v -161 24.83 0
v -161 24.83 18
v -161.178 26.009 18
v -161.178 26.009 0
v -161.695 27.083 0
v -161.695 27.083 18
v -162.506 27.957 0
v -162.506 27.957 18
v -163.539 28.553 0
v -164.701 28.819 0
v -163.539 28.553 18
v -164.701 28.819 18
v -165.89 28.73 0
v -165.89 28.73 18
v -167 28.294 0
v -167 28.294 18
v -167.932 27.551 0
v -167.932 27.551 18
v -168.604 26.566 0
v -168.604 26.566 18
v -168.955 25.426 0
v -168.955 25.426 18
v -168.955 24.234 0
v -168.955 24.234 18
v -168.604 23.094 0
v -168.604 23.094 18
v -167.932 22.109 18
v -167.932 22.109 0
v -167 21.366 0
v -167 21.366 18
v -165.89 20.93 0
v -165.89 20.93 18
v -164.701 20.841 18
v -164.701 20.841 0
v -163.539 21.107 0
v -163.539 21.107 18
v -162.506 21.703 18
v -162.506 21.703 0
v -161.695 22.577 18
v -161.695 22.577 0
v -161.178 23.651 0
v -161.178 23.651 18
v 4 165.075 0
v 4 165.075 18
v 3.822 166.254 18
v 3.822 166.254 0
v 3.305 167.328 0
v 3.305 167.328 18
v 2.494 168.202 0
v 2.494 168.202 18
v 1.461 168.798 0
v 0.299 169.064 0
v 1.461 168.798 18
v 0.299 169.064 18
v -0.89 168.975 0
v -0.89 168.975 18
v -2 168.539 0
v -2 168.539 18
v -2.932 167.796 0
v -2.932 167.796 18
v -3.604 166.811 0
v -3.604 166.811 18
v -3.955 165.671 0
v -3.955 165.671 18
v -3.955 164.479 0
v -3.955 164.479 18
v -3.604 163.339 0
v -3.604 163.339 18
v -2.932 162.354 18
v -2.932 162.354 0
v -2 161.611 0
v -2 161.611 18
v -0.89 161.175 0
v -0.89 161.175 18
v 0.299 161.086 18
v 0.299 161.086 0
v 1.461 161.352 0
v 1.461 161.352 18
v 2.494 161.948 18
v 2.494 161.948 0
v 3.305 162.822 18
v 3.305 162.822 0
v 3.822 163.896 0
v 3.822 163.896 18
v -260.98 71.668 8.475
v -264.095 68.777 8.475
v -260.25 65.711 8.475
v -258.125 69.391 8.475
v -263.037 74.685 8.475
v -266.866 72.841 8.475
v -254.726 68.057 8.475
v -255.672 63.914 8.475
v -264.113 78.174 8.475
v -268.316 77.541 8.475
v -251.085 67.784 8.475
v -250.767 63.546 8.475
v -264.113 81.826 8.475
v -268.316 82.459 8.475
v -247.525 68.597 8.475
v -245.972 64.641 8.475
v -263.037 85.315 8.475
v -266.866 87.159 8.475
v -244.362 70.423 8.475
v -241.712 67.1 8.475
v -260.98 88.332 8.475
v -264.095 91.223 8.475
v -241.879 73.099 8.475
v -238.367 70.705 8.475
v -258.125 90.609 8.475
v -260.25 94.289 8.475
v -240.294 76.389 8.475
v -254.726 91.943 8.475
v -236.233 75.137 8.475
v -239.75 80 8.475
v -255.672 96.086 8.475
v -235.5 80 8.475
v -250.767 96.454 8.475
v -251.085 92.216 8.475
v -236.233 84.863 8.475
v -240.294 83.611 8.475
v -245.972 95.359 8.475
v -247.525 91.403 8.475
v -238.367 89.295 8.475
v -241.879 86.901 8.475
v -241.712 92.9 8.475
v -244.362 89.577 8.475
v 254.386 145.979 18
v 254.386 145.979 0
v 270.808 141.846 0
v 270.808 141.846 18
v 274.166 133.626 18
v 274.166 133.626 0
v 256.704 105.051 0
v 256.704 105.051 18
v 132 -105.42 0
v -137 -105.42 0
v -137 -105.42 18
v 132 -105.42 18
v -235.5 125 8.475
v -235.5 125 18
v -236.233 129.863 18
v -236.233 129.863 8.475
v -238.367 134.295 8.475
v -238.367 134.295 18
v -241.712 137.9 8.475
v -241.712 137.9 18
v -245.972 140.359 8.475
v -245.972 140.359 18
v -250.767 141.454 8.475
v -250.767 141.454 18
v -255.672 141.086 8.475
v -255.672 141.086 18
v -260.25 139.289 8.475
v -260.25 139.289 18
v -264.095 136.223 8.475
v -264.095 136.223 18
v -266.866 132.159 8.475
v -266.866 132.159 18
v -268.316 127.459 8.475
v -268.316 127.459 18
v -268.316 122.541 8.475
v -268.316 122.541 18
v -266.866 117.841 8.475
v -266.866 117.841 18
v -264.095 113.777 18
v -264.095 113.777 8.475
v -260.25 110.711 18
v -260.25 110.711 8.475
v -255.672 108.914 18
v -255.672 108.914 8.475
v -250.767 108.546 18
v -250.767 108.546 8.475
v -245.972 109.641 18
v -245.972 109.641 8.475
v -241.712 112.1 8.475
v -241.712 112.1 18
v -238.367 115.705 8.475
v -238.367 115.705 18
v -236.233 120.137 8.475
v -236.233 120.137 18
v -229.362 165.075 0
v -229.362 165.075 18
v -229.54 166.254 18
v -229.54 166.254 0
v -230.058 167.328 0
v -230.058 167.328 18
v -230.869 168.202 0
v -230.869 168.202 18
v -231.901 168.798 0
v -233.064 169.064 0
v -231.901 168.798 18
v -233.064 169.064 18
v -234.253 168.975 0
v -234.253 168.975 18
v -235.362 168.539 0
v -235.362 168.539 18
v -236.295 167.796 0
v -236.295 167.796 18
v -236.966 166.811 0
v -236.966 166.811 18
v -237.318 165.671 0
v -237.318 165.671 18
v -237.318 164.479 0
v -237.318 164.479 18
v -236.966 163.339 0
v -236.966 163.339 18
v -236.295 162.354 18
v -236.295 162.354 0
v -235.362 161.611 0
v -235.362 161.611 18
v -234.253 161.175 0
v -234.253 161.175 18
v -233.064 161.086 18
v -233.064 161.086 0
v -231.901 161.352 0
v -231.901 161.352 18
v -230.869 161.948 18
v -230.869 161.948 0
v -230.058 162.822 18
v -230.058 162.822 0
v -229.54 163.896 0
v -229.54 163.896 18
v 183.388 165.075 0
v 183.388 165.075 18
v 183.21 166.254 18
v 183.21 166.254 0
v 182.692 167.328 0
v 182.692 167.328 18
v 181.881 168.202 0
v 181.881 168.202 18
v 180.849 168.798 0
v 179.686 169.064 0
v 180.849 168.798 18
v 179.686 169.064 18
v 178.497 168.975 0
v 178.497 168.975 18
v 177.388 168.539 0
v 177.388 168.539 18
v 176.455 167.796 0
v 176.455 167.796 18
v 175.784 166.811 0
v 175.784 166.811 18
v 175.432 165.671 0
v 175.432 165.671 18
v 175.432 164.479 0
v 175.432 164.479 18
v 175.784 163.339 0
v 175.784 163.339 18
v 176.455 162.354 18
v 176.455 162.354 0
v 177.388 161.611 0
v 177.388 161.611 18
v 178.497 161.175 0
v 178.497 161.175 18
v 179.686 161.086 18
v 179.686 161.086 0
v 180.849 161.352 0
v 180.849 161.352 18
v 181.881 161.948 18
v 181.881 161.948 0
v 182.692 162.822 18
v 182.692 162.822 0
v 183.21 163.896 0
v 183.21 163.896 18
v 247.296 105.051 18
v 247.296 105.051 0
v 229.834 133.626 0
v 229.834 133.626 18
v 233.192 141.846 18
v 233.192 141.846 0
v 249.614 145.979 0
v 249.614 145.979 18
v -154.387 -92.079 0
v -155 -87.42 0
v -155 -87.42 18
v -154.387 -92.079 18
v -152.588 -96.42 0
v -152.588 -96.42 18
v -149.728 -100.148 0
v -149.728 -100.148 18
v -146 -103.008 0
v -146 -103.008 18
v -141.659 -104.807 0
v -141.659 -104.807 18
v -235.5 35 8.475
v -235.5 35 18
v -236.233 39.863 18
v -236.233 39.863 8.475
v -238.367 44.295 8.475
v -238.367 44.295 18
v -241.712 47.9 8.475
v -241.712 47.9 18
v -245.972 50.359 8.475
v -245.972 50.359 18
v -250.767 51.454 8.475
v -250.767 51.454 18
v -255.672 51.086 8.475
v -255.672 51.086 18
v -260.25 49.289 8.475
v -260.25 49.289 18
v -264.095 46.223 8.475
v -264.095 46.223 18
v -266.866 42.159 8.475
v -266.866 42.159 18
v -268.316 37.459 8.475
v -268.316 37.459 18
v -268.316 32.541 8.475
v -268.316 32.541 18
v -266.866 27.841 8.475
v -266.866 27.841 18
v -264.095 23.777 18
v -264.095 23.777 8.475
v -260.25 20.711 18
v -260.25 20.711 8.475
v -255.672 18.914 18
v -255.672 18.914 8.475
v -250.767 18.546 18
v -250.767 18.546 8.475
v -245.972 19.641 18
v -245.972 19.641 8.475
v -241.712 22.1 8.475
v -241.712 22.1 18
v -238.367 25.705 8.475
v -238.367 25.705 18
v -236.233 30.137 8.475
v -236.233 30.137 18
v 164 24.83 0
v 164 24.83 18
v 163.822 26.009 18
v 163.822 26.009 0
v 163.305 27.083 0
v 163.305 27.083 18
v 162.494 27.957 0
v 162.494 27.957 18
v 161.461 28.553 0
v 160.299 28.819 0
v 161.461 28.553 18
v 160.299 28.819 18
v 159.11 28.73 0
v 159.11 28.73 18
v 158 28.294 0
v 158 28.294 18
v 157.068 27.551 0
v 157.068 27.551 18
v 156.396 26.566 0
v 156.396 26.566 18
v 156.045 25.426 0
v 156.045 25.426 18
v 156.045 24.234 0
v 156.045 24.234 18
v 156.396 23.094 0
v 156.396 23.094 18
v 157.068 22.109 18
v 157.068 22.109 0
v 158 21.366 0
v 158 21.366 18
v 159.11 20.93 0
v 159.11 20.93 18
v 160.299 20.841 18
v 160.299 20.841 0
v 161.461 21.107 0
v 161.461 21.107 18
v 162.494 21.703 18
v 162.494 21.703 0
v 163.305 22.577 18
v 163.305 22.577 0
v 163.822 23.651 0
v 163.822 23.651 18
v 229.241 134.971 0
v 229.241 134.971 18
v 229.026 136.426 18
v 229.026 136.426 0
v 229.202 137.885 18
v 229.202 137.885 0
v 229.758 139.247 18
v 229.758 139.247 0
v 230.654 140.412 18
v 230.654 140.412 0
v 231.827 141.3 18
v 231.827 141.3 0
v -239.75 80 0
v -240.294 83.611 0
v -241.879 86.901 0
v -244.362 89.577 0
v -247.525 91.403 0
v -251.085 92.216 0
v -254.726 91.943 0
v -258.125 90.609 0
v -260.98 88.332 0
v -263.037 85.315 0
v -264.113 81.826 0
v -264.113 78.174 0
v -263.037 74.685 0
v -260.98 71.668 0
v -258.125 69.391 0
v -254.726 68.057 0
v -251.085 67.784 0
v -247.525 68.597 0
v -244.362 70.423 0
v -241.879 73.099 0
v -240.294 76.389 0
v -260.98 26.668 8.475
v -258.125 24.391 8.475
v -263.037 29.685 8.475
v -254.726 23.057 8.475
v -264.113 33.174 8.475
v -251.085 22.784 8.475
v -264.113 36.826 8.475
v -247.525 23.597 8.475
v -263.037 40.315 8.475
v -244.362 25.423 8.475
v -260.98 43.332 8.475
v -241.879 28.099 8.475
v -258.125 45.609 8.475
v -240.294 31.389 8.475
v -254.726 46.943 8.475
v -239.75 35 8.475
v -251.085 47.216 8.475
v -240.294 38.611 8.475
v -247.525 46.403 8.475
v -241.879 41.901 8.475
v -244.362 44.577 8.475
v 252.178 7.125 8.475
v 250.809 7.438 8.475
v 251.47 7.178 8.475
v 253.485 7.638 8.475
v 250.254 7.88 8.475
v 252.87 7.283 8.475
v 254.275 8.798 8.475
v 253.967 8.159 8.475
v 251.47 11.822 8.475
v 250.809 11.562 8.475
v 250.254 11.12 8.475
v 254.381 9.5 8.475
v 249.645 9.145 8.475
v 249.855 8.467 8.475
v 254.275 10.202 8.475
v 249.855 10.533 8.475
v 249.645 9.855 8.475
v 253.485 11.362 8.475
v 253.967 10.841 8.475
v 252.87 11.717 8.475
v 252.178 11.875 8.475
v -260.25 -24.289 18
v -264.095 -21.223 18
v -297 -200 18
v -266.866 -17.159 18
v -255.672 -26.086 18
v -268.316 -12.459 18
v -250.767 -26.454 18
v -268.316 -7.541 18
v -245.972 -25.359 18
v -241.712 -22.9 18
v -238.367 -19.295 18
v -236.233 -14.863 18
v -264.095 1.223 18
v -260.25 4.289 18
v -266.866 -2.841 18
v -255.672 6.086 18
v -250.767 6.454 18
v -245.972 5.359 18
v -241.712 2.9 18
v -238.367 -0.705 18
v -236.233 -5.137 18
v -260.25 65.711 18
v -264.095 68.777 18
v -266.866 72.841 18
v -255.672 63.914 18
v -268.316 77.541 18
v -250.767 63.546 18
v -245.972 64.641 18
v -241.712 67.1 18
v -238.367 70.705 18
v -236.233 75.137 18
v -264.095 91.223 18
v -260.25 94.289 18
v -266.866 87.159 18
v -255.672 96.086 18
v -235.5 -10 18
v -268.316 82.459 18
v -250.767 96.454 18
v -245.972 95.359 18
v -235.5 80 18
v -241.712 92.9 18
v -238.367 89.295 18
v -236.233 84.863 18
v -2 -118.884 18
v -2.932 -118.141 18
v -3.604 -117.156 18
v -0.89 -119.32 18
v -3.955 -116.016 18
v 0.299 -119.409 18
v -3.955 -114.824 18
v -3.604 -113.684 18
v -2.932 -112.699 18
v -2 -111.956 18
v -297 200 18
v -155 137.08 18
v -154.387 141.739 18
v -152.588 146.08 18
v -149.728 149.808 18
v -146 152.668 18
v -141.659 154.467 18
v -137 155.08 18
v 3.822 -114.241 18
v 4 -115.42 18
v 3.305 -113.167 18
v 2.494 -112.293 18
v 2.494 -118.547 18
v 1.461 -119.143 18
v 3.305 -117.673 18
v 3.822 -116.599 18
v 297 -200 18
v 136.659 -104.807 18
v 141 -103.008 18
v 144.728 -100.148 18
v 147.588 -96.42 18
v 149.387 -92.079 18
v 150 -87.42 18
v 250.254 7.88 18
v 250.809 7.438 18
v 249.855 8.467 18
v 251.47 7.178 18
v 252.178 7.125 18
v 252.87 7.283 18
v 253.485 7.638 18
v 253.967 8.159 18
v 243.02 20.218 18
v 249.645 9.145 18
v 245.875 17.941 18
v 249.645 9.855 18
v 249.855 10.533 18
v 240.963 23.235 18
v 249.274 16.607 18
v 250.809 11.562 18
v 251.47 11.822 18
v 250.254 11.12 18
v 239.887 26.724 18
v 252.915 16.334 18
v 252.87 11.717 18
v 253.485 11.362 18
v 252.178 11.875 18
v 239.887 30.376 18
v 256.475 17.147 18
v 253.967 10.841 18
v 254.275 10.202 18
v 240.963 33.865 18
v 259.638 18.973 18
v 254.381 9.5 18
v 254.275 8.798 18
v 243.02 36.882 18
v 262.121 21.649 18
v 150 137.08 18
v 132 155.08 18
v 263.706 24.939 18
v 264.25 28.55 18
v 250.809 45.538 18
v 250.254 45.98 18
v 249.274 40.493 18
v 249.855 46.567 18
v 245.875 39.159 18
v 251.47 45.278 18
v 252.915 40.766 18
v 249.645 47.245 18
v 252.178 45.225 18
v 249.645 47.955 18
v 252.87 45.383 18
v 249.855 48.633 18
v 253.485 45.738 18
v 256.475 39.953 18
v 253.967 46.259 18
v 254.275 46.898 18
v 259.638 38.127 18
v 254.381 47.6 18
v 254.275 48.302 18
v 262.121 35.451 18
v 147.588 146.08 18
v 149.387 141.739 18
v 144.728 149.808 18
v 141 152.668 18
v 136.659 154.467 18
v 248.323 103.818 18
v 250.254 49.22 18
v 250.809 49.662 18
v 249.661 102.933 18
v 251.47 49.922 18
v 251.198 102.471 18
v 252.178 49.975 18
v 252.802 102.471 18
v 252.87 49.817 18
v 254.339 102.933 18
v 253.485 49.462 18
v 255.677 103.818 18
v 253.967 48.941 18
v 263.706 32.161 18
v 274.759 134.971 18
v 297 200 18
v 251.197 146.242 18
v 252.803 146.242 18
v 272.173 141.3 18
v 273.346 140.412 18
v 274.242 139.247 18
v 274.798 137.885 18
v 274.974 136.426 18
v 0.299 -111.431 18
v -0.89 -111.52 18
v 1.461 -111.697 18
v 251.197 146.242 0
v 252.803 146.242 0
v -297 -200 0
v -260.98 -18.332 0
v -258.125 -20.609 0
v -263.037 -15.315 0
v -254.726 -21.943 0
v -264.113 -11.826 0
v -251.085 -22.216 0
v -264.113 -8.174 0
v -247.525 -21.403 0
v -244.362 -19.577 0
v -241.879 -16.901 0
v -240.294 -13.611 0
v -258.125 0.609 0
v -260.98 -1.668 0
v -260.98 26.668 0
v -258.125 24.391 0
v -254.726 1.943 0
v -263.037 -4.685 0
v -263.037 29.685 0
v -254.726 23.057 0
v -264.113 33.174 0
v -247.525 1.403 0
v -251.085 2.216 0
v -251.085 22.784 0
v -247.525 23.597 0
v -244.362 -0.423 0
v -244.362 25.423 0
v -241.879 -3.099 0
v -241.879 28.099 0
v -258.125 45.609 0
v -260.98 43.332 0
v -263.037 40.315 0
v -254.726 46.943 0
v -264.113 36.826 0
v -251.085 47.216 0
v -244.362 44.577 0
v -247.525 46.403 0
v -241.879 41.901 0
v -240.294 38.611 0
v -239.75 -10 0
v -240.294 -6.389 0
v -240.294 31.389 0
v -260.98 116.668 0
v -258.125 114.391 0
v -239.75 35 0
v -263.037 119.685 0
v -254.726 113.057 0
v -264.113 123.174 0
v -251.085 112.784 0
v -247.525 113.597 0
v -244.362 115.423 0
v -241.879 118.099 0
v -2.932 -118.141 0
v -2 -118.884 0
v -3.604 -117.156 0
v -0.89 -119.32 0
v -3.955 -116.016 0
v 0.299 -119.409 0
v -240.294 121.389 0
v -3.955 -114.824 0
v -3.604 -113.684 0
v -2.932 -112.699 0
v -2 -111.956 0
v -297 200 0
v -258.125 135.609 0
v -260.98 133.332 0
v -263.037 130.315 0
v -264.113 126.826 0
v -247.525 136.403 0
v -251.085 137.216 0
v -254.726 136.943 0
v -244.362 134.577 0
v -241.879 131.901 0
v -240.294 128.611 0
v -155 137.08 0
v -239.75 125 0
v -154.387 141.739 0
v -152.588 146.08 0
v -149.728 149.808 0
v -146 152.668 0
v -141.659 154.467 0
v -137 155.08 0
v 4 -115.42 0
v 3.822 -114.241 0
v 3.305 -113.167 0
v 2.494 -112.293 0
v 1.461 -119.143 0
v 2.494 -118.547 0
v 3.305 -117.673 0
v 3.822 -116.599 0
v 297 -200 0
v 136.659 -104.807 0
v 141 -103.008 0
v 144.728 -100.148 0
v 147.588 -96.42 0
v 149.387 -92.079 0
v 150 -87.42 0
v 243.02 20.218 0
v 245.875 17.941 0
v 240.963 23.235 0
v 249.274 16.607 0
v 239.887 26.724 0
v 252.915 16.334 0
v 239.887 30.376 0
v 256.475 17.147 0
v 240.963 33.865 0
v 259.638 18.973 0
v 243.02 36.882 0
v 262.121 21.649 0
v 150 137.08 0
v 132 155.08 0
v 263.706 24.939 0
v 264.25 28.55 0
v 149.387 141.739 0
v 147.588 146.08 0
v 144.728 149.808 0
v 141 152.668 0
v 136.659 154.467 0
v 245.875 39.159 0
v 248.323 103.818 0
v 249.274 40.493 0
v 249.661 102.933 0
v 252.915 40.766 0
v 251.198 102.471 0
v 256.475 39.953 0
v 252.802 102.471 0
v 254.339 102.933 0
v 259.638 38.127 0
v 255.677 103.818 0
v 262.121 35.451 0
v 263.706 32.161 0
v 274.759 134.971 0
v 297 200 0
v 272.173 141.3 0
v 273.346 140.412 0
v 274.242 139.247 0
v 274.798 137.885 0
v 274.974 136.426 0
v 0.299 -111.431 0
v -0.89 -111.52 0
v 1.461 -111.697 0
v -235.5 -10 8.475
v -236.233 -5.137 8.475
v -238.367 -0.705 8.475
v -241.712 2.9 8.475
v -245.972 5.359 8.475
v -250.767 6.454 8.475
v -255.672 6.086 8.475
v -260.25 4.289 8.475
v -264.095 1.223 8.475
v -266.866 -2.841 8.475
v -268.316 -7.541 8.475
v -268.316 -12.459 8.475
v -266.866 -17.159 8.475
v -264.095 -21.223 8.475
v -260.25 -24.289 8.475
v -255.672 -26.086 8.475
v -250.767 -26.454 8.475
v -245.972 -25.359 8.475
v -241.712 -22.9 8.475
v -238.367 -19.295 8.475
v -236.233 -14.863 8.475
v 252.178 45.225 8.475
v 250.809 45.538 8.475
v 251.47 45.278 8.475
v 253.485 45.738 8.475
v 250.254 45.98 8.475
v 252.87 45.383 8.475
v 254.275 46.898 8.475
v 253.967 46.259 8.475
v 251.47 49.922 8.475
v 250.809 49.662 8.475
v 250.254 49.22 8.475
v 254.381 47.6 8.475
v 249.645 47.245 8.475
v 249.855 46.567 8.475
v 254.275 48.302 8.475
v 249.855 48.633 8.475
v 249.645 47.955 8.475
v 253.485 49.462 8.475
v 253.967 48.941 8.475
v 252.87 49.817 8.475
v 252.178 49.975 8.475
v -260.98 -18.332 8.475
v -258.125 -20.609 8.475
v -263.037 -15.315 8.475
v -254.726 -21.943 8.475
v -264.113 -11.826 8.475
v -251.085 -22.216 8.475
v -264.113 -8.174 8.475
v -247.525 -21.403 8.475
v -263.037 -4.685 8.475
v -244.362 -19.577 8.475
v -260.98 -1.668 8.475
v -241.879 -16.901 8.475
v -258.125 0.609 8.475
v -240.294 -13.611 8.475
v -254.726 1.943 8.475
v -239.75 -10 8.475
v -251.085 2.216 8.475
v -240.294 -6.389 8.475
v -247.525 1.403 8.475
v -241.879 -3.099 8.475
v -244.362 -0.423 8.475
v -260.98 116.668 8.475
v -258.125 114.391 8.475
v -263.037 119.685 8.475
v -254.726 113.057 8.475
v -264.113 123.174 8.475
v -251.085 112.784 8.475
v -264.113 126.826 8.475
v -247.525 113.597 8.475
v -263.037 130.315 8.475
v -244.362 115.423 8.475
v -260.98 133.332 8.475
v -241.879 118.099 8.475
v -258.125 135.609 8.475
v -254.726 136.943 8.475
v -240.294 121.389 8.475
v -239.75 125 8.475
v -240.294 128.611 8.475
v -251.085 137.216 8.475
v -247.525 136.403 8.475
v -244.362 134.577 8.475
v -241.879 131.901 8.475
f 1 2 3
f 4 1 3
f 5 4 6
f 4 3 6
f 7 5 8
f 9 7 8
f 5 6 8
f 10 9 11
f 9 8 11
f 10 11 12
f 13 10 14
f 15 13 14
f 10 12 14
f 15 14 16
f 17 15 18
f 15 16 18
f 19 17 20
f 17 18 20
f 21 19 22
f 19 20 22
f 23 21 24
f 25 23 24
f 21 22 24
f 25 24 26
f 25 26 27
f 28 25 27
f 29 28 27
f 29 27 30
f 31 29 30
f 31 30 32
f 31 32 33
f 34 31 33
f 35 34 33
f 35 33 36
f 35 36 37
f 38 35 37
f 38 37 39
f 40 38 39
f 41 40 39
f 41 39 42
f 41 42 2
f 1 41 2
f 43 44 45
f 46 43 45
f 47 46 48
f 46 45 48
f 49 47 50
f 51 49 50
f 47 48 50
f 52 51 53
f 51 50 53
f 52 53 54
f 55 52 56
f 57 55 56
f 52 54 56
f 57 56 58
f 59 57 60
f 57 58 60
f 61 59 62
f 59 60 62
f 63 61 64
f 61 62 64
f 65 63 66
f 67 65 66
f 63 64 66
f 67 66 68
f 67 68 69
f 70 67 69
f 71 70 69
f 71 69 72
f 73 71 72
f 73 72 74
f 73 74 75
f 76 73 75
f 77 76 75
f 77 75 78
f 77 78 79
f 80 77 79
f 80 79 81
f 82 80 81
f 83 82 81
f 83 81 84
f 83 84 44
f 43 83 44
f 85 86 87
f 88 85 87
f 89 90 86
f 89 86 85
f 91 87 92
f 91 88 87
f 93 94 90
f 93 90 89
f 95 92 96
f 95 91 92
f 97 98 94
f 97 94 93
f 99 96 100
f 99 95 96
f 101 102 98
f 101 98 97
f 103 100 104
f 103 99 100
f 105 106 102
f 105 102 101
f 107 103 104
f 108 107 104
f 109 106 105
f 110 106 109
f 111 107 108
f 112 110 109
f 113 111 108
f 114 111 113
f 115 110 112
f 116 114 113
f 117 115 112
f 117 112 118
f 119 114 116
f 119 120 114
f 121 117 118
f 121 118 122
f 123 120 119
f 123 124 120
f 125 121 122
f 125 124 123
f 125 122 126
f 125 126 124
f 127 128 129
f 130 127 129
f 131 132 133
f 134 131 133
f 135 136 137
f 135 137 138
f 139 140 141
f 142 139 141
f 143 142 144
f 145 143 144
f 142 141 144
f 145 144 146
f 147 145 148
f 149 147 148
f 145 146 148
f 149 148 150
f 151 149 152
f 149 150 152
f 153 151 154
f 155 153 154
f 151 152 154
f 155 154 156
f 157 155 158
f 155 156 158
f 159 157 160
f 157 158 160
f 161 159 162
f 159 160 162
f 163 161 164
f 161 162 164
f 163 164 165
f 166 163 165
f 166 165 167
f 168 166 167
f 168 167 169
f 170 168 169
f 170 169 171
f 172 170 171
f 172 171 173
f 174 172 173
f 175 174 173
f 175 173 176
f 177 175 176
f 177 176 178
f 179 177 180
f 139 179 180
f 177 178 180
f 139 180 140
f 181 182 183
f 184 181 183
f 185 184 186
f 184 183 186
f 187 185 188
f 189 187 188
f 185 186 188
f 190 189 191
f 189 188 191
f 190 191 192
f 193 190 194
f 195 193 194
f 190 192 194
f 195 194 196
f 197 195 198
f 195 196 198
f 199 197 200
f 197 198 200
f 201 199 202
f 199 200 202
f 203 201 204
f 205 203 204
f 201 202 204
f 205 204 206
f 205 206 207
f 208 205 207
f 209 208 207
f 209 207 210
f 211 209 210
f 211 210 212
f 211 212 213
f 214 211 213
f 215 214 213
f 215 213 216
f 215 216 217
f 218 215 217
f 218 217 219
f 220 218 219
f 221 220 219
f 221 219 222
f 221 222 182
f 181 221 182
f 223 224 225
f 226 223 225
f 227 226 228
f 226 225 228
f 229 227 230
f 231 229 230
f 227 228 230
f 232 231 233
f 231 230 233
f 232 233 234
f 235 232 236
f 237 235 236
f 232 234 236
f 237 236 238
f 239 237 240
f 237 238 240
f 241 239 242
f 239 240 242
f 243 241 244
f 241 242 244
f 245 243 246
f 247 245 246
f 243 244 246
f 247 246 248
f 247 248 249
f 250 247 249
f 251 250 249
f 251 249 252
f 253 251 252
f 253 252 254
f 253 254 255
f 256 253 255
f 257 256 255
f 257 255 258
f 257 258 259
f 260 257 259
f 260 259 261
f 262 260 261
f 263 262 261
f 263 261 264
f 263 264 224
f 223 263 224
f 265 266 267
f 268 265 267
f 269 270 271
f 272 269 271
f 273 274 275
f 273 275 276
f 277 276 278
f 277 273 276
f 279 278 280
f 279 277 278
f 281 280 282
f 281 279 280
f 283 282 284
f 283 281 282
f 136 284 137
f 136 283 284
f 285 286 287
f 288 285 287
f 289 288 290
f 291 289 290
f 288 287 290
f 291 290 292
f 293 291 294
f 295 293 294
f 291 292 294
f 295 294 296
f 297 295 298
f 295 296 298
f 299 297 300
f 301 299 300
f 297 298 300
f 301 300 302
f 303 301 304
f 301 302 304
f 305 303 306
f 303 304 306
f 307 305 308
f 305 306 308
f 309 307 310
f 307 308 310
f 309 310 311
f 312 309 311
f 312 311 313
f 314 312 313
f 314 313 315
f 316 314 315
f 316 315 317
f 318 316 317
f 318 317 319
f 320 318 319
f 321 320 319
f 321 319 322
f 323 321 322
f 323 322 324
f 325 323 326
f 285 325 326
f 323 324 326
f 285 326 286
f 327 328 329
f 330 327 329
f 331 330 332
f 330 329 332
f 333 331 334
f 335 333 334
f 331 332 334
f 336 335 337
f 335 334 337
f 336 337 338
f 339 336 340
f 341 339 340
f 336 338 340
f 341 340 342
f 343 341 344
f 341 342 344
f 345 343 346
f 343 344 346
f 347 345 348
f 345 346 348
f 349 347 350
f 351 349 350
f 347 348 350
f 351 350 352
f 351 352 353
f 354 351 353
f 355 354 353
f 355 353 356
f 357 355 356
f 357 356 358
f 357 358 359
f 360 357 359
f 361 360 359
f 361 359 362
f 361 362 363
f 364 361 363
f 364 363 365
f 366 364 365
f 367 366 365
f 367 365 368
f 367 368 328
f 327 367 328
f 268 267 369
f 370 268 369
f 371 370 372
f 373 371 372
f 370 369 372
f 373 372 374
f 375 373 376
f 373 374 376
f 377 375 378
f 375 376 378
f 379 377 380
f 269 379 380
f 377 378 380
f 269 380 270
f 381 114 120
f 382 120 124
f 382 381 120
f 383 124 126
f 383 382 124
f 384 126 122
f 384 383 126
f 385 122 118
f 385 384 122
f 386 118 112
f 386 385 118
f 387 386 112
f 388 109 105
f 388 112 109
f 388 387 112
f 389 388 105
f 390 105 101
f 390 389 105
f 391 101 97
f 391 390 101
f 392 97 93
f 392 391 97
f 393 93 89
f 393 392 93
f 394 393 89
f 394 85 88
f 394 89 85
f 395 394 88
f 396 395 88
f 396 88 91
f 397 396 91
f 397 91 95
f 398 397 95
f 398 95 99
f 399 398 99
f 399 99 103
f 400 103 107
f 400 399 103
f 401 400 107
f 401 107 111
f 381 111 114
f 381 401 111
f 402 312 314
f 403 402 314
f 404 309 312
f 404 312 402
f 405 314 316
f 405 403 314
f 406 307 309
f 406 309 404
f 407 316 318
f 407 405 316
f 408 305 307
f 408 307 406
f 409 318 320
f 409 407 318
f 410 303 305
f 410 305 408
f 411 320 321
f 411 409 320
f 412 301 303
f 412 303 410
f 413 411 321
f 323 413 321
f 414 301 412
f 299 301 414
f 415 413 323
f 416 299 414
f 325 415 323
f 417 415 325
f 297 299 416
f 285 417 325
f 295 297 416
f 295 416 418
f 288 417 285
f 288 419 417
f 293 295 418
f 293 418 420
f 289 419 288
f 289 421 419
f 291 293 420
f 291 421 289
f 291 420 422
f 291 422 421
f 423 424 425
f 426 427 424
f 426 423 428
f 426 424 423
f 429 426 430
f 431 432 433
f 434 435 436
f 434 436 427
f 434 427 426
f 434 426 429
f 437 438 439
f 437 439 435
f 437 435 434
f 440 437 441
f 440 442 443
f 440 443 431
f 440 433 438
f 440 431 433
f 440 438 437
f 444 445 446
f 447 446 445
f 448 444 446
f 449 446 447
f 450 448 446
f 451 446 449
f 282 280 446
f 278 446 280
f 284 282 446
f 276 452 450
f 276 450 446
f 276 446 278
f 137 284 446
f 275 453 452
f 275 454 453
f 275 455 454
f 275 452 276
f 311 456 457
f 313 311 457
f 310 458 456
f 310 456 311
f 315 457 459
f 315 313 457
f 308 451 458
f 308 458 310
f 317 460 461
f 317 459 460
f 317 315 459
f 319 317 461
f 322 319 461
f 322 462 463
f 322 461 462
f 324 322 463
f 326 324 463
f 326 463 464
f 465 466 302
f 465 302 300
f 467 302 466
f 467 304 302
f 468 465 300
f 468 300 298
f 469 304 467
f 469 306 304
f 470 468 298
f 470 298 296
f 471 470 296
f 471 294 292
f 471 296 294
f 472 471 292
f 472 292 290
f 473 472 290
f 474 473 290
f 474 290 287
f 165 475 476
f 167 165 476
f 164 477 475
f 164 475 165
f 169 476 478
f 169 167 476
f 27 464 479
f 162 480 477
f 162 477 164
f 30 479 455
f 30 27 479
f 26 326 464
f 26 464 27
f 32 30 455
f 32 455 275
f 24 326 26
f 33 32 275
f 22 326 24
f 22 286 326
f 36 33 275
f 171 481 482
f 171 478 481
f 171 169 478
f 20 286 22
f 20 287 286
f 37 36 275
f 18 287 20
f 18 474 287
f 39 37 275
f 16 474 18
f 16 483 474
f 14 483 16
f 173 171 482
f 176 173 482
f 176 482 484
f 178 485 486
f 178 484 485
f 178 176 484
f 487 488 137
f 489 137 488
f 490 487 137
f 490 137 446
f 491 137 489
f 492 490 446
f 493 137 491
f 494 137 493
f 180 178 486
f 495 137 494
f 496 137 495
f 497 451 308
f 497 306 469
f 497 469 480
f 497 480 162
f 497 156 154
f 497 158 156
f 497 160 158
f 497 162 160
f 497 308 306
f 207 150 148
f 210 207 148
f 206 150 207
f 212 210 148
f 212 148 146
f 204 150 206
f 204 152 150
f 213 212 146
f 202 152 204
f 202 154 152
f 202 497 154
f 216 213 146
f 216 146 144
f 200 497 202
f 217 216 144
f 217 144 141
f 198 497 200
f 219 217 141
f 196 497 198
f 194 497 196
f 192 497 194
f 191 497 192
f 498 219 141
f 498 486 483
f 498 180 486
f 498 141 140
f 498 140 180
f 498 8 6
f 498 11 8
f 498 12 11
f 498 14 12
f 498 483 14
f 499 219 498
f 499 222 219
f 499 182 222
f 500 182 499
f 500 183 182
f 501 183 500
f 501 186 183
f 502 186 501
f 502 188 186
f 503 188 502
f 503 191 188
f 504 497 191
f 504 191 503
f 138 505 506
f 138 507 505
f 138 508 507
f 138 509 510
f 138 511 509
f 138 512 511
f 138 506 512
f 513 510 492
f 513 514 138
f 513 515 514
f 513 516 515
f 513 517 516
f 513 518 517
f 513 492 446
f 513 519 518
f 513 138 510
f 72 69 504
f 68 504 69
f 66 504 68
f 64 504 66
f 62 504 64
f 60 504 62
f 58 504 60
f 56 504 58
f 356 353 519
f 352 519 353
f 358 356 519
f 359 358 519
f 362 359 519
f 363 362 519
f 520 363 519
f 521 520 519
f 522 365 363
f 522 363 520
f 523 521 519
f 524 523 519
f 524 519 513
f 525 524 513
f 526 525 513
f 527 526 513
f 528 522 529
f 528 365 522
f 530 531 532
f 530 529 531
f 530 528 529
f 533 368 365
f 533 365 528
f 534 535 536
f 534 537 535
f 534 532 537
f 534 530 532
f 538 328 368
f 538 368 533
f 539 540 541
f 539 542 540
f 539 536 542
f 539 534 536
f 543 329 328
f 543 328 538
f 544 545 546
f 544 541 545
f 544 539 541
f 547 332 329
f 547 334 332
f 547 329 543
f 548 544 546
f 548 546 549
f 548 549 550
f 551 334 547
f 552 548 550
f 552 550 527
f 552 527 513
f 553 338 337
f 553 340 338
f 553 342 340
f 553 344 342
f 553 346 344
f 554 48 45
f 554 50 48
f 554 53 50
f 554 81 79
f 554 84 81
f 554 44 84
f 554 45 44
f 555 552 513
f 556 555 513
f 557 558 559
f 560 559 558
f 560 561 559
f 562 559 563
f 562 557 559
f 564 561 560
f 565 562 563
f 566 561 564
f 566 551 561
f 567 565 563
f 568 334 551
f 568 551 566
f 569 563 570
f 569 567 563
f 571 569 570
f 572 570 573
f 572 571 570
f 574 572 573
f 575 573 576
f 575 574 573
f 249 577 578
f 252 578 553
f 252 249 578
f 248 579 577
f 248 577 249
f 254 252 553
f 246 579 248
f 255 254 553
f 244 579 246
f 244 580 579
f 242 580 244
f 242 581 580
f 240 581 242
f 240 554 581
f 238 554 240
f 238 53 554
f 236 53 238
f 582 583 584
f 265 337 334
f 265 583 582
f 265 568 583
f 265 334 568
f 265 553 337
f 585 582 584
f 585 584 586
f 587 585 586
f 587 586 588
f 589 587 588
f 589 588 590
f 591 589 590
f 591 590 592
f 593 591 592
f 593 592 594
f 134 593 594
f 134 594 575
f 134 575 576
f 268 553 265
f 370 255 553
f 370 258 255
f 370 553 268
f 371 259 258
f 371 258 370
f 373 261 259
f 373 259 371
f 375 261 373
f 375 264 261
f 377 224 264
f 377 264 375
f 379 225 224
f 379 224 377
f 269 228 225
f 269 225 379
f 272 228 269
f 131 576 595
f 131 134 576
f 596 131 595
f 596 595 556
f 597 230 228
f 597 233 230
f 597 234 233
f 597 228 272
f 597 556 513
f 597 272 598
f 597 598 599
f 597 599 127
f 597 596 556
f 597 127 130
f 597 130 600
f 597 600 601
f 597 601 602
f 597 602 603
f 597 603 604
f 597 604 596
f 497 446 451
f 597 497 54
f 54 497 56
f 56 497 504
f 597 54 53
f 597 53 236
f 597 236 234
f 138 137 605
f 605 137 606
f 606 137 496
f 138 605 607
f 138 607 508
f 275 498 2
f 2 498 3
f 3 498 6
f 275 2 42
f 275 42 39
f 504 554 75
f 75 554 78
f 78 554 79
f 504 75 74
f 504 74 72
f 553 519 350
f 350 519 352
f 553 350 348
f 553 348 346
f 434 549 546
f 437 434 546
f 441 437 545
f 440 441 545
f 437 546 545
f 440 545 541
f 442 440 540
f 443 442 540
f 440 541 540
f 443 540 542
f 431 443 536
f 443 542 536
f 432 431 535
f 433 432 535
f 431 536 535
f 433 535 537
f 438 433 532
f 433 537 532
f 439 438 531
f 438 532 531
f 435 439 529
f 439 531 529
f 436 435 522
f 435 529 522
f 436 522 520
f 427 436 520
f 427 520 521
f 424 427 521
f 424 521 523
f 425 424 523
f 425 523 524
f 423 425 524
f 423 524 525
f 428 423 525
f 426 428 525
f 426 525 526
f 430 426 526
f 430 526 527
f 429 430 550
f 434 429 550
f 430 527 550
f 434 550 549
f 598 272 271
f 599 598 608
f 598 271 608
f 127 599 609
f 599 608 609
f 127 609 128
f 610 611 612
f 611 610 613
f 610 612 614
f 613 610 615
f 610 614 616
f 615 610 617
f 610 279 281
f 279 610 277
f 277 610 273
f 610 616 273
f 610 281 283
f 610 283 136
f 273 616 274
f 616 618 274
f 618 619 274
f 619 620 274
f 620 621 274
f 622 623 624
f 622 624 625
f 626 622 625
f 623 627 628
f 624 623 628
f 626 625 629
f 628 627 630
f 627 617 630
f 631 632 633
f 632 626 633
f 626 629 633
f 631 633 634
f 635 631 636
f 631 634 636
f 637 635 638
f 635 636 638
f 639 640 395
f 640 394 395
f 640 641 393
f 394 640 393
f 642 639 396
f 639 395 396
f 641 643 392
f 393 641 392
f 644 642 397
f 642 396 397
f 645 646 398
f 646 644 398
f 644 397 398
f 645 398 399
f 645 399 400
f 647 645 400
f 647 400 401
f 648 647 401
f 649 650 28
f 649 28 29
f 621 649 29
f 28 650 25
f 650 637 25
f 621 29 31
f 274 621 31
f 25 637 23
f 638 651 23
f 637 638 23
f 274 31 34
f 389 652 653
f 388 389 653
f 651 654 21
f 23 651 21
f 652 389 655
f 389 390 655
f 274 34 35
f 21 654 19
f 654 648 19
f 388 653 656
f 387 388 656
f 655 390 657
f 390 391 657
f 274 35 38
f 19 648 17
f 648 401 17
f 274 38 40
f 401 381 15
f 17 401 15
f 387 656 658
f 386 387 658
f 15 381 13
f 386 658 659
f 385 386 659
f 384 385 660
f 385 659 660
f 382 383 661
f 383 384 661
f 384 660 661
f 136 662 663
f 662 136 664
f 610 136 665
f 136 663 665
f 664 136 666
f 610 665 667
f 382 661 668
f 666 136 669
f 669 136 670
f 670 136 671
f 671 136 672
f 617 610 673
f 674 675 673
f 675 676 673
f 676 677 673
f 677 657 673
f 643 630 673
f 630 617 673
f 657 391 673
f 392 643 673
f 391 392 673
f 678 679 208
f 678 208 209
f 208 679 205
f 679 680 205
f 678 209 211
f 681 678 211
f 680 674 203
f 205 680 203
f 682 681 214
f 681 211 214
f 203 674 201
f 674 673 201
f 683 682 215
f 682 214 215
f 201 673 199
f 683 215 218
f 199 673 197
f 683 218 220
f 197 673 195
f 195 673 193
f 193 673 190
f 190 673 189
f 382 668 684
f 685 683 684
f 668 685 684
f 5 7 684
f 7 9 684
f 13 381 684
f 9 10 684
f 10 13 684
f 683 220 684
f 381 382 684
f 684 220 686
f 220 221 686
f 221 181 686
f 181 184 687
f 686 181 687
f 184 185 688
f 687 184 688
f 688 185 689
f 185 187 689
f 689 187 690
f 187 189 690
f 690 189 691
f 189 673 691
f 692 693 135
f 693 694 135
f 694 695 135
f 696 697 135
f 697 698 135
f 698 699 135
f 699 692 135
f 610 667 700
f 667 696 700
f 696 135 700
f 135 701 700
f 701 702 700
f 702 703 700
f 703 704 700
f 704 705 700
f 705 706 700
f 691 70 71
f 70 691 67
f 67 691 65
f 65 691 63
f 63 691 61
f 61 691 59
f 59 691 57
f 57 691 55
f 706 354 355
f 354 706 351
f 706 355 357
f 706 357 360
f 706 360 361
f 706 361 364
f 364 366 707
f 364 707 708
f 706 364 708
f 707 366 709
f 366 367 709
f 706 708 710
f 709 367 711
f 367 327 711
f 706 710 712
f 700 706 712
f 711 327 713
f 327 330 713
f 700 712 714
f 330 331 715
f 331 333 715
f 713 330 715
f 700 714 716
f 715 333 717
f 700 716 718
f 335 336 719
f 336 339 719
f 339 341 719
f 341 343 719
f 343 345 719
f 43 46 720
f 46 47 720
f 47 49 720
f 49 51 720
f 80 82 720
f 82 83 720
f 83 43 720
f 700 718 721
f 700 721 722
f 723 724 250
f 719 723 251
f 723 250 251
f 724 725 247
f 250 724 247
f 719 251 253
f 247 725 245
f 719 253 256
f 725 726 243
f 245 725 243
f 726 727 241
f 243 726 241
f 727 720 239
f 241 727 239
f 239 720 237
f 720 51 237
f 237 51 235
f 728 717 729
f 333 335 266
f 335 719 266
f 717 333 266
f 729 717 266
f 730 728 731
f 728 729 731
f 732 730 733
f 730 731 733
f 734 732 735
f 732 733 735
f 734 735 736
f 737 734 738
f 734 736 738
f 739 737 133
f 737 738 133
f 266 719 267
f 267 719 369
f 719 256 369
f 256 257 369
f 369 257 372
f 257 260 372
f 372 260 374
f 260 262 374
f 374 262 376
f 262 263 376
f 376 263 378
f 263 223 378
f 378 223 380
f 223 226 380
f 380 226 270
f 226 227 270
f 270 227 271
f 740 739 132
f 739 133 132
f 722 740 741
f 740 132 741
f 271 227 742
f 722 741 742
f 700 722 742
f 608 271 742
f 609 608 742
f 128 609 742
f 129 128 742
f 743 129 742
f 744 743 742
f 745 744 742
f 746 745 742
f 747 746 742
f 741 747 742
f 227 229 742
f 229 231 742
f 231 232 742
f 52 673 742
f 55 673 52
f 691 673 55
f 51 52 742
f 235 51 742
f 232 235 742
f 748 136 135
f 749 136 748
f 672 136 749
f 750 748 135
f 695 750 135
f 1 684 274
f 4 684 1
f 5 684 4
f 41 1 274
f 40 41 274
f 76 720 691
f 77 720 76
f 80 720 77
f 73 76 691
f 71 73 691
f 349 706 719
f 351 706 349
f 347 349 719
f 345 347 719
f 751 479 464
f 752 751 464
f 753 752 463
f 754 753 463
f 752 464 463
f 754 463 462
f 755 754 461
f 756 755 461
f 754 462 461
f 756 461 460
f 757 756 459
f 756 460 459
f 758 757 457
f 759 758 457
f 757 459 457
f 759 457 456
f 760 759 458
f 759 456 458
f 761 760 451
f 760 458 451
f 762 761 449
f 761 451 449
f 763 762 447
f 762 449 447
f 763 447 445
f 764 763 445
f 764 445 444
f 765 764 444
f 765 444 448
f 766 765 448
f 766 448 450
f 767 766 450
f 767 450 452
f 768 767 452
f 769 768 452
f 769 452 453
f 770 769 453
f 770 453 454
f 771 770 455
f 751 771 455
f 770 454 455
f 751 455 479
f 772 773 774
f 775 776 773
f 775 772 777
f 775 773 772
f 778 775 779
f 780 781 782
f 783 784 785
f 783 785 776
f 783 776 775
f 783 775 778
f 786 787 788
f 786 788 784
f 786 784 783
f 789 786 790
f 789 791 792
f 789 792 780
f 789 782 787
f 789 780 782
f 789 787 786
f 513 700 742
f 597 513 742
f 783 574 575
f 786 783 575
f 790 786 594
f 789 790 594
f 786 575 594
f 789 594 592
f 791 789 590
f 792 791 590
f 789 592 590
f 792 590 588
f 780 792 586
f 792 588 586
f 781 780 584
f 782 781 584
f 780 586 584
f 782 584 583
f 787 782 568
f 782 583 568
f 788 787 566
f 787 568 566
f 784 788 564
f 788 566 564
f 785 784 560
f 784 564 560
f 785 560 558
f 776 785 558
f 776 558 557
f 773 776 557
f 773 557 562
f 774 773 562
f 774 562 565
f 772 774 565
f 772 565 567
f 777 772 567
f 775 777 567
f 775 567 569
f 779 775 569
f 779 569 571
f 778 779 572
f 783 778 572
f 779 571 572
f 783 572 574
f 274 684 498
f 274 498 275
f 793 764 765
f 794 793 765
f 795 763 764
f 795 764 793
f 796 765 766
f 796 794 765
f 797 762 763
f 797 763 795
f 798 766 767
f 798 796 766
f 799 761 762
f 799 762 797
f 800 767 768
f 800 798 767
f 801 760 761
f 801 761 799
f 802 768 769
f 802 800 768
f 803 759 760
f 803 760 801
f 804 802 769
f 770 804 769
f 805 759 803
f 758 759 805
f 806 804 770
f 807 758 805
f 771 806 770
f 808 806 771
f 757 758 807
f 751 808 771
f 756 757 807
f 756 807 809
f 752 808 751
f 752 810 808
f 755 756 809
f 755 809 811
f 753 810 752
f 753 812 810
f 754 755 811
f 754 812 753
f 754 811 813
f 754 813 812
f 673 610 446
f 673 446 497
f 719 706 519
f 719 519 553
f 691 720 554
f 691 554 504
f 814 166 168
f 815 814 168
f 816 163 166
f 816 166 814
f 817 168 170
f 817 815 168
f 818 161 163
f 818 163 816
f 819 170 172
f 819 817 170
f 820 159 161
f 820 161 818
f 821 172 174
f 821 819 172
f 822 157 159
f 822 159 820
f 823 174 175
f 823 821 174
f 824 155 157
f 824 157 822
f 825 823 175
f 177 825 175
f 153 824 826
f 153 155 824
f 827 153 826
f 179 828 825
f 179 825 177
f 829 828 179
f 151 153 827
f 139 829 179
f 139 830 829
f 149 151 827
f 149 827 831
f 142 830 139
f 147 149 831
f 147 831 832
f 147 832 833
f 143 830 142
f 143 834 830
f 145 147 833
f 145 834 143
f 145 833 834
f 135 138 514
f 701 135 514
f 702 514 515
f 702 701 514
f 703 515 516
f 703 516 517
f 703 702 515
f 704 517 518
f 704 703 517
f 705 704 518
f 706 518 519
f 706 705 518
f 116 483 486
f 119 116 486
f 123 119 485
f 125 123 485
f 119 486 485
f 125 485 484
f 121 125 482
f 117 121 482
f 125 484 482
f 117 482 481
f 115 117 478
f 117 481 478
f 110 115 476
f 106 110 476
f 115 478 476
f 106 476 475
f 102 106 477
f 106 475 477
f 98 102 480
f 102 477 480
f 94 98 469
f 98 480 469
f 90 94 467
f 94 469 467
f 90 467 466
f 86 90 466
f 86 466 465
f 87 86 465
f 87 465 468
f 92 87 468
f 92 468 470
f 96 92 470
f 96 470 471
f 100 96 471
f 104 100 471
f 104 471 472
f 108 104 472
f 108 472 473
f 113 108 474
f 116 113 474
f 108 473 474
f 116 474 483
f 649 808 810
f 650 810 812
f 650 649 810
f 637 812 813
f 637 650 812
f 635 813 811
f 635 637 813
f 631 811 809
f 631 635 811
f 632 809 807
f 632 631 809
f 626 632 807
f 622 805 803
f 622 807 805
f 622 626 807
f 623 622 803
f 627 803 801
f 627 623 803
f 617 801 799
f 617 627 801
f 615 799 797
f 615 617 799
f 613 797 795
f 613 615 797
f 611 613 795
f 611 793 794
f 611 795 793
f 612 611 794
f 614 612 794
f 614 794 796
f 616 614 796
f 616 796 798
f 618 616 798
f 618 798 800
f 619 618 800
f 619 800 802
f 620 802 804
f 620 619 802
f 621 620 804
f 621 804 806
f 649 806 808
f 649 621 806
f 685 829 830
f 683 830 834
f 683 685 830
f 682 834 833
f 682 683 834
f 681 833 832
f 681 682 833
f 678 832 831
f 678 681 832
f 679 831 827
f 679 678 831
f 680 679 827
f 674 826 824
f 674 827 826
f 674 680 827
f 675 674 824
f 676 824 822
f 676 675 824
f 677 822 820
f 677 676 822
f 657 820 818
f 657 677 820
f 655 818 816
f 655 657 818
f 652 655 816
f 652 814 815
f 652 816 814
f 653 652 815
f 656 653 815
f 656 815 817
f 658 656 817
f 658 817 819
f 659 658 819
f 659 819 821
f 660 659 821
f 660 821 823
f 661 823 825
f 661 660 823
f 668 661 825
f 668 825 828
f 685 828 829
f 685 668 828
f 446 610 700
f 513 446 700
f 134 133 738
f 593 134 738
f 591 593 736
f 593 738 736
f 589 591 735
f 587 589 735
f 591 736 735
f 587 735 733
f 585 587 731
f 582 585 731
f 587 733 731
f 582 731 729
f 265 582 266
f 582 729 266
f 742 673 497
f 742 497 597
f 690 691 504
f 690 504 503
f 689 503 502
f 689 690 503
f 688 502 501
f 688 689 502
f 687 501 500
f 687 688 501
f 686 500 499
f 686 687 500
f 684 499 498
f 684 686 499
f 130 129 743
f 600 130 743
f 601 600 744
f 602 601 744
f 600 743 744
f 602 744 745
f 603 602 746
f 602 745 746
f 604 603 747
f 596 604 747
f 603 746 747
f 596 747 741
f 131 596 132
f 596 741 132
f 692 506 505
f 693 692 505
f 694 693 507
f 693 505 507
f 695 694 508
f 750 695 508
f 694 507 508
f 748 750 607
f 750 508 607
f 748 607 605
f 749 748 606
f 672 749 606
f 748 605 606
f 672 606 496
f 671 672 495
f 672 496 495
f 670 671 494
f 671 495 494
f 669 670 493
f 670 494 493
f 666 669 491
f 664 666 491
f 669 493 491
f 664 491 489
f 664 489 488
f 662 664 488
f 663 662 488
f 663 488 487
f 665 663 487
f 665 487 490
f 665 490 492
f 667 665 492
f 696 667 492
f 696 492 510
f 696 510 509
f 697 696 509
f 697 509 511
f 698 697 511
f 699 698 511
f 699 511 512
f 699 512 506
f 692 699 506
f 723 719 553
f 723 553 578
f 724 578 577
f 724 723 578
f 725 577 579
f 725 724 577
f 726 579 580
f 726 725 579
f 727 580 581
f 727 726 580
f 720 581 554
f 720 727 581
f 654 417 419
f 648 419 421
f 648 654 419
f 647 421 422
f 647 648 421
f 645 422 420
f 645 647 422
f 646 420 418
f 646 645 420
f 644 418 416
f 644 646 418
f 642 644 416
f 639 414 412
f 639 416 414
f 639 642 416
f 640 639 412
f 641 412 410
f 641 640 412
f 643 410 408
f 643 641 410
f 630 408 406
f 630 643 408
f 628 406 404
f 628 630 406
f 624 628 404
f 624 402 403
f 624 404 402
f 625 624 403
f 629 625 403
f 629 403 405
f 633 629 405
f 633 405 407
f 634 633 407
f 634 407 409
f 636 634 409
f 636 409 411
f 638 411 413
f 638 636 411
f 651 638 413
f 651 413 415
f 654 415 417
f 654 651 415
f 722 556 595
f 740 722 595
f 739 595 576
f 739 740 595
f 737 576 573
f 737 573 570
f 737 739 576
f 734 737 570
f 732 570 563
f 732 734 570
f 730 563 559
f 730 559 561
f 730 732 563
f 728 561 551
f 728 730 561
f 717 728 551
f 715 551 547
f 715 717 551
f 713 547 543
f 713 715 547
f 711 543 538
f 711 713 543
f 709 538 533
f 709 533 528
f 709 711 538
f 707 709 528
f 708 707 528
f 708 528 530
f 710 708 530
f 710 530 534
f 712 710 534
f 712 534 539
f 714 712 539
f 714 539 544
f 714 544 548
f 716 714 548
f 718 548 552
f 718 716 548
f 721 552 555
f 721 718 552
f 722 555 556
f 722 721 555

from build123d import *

# Parameters (mm, degrees)
SKETCH1_W           = 594
SKETCH1_H           = 400
SKETCH1_R           = 12.25
BOSS_EXTRUDE1_DEPTH = 18
SKETCH2_R           = 16.5
CUT_EXTRUDE1_DEPTH  = 9.525
SKETCH3_R           = 4
CUT_EXTRUDE2_DEPTH  = 80
SKETCH4_R           = 2.38125
CUT_EXTRUDE3_DEPTH  = 9.525


with BuildPart() as part:
    # Sketch1 → Boss-Extrude1 (new body)
    with BuildSketch(Plane.XY):
        Rectangle(SKETCH1_W, SKETCH1_H)
        with Locations((252, 28.55)):
            Circle(SKETCH1_R, mode=Mode.SUBTRACT)
        with Locations((-252, 125)):
            Circle(SKETCH1_R, mode=Mode.SUBTRACT)
        with Locations((-252, 80)):
            Circle(SKETCH1_R, mode=Mode.SUBTRACT)
        with Locations((-252, 35)):
            Circle(SKETCH1_R, mode=Mode.SUBTRACT)
        with Locations((-252, -10)):
            Circle(SKETCH1_R, mode=Mode.SUBTRACT)
        with BuildLine():
            Line((-137, -105.42), (132, -105.42))
            ThreePointArc((132, -105.42), (144.727922061, -100.147922061), (150, -87.42))
            Line((150, -87.42), (150, 137.08))
            ThreePointArc((150, 137.08), (144.727922061, 149.807922061), (132, 155.08))
            Line((132, 155.08), (-137, 155.08))
            ThreePointArc((-137, 155.08), (-149.727922061, 149.807922061), (-155, 137.08))
            Line((-155, 137.08), (-155, -87.42))
            ThreePointArc((-155, -87.42), (-149.727922061, -100.147922061), (-137, -105.42))
        make_face(mode=Mode.SUBTRACT)
        with BuildLine():
            Line((254.386023622, 145.979320454), (270.808070866, 141.845754885))
            ThreePointArc((270.808070866, 141.845754885), (274.565595901, 138.584722637), (274.166216108, 133.625506823))
            Line((274.166216108, 133.625506823), (256.703716108, 105.050506823))
            ThreePointArc((256.703716108, 105.050506823), (252, 102.4125), (247.296283892, 105.050506823))
            Line((247.296283892, 105.050506823), (229.833783892, 133.625506823))
            ThreePointArc((229.833783892, 133.625506823), (229.434404099, 138.584722637), (233.191929134, 141.845754885))
            Line((233.191929134, 141.845754885), (249.613976378, 145.979320454))
            ThreePointArc((249.613976378, 145.979320454), (252, 146.275), (254.386023622, 145.979320454))
        make_face(mode=Mode.SUBTRACT)
    extrude(amount=BOSS_EXTRUDE1_DEPTH)

    # Sketch2 → Cut-Extrude1 (cut)
    with BuildSketch(Plane.XY.offset(18)):
        with Locations((-252, 125)):
            Circle(SKETCH2_R)
        with Locations((-252, 80)):
            Circle(SKETCH2_R)
        with Locations((-252, 35)):
            Circle(SKETCH2_R)
        with Locations((-252, -10)):
            Circle(SKETCH2_R)
    extrude(amount=-CUT_EXTRUDE1_DEPTH, mode=Mode.SUBTRACT)

    # Sketch3 → Cut-Extrude2 (cut)
    with BuildSketch(Plane.XY.offset(18)):
        with Locations((0, 165.075)):
            Circle(SKETCH3_R)
        with Locations((-233.3625, 165.075)):
            Circle(SKETCH3_R)
        with Locations((179.3875, 165.075)):
            Circle(SKETCH3_R)
        with Locations((0, -115.42)):
            Circle(SKETCH3_R)
        with Locations((-165, 24.83)):
            Circle(SKETCH3_R)
        with Locations((160, 24.83)):
            Circle(SKETCH3_R)
    extrude(amount=-CUT_EXTRUDE2_DEPTH, mode=Mode.SUBTRACT)

    # Sketch4 → Cut-Extrude3 (cut)
    with BuildSketch(Plane.XY.offset(18)):
        with Locations((252, 47.6)):
            Circle(SKETCH4_R)
        with Locations((252, 9.5)):
            Circle(SKETCH4_R)
    extrude(amount=-CUT_EXTRUDE3_DEPTH, mode=Mode.SUBTRACT)


solid = part.part
